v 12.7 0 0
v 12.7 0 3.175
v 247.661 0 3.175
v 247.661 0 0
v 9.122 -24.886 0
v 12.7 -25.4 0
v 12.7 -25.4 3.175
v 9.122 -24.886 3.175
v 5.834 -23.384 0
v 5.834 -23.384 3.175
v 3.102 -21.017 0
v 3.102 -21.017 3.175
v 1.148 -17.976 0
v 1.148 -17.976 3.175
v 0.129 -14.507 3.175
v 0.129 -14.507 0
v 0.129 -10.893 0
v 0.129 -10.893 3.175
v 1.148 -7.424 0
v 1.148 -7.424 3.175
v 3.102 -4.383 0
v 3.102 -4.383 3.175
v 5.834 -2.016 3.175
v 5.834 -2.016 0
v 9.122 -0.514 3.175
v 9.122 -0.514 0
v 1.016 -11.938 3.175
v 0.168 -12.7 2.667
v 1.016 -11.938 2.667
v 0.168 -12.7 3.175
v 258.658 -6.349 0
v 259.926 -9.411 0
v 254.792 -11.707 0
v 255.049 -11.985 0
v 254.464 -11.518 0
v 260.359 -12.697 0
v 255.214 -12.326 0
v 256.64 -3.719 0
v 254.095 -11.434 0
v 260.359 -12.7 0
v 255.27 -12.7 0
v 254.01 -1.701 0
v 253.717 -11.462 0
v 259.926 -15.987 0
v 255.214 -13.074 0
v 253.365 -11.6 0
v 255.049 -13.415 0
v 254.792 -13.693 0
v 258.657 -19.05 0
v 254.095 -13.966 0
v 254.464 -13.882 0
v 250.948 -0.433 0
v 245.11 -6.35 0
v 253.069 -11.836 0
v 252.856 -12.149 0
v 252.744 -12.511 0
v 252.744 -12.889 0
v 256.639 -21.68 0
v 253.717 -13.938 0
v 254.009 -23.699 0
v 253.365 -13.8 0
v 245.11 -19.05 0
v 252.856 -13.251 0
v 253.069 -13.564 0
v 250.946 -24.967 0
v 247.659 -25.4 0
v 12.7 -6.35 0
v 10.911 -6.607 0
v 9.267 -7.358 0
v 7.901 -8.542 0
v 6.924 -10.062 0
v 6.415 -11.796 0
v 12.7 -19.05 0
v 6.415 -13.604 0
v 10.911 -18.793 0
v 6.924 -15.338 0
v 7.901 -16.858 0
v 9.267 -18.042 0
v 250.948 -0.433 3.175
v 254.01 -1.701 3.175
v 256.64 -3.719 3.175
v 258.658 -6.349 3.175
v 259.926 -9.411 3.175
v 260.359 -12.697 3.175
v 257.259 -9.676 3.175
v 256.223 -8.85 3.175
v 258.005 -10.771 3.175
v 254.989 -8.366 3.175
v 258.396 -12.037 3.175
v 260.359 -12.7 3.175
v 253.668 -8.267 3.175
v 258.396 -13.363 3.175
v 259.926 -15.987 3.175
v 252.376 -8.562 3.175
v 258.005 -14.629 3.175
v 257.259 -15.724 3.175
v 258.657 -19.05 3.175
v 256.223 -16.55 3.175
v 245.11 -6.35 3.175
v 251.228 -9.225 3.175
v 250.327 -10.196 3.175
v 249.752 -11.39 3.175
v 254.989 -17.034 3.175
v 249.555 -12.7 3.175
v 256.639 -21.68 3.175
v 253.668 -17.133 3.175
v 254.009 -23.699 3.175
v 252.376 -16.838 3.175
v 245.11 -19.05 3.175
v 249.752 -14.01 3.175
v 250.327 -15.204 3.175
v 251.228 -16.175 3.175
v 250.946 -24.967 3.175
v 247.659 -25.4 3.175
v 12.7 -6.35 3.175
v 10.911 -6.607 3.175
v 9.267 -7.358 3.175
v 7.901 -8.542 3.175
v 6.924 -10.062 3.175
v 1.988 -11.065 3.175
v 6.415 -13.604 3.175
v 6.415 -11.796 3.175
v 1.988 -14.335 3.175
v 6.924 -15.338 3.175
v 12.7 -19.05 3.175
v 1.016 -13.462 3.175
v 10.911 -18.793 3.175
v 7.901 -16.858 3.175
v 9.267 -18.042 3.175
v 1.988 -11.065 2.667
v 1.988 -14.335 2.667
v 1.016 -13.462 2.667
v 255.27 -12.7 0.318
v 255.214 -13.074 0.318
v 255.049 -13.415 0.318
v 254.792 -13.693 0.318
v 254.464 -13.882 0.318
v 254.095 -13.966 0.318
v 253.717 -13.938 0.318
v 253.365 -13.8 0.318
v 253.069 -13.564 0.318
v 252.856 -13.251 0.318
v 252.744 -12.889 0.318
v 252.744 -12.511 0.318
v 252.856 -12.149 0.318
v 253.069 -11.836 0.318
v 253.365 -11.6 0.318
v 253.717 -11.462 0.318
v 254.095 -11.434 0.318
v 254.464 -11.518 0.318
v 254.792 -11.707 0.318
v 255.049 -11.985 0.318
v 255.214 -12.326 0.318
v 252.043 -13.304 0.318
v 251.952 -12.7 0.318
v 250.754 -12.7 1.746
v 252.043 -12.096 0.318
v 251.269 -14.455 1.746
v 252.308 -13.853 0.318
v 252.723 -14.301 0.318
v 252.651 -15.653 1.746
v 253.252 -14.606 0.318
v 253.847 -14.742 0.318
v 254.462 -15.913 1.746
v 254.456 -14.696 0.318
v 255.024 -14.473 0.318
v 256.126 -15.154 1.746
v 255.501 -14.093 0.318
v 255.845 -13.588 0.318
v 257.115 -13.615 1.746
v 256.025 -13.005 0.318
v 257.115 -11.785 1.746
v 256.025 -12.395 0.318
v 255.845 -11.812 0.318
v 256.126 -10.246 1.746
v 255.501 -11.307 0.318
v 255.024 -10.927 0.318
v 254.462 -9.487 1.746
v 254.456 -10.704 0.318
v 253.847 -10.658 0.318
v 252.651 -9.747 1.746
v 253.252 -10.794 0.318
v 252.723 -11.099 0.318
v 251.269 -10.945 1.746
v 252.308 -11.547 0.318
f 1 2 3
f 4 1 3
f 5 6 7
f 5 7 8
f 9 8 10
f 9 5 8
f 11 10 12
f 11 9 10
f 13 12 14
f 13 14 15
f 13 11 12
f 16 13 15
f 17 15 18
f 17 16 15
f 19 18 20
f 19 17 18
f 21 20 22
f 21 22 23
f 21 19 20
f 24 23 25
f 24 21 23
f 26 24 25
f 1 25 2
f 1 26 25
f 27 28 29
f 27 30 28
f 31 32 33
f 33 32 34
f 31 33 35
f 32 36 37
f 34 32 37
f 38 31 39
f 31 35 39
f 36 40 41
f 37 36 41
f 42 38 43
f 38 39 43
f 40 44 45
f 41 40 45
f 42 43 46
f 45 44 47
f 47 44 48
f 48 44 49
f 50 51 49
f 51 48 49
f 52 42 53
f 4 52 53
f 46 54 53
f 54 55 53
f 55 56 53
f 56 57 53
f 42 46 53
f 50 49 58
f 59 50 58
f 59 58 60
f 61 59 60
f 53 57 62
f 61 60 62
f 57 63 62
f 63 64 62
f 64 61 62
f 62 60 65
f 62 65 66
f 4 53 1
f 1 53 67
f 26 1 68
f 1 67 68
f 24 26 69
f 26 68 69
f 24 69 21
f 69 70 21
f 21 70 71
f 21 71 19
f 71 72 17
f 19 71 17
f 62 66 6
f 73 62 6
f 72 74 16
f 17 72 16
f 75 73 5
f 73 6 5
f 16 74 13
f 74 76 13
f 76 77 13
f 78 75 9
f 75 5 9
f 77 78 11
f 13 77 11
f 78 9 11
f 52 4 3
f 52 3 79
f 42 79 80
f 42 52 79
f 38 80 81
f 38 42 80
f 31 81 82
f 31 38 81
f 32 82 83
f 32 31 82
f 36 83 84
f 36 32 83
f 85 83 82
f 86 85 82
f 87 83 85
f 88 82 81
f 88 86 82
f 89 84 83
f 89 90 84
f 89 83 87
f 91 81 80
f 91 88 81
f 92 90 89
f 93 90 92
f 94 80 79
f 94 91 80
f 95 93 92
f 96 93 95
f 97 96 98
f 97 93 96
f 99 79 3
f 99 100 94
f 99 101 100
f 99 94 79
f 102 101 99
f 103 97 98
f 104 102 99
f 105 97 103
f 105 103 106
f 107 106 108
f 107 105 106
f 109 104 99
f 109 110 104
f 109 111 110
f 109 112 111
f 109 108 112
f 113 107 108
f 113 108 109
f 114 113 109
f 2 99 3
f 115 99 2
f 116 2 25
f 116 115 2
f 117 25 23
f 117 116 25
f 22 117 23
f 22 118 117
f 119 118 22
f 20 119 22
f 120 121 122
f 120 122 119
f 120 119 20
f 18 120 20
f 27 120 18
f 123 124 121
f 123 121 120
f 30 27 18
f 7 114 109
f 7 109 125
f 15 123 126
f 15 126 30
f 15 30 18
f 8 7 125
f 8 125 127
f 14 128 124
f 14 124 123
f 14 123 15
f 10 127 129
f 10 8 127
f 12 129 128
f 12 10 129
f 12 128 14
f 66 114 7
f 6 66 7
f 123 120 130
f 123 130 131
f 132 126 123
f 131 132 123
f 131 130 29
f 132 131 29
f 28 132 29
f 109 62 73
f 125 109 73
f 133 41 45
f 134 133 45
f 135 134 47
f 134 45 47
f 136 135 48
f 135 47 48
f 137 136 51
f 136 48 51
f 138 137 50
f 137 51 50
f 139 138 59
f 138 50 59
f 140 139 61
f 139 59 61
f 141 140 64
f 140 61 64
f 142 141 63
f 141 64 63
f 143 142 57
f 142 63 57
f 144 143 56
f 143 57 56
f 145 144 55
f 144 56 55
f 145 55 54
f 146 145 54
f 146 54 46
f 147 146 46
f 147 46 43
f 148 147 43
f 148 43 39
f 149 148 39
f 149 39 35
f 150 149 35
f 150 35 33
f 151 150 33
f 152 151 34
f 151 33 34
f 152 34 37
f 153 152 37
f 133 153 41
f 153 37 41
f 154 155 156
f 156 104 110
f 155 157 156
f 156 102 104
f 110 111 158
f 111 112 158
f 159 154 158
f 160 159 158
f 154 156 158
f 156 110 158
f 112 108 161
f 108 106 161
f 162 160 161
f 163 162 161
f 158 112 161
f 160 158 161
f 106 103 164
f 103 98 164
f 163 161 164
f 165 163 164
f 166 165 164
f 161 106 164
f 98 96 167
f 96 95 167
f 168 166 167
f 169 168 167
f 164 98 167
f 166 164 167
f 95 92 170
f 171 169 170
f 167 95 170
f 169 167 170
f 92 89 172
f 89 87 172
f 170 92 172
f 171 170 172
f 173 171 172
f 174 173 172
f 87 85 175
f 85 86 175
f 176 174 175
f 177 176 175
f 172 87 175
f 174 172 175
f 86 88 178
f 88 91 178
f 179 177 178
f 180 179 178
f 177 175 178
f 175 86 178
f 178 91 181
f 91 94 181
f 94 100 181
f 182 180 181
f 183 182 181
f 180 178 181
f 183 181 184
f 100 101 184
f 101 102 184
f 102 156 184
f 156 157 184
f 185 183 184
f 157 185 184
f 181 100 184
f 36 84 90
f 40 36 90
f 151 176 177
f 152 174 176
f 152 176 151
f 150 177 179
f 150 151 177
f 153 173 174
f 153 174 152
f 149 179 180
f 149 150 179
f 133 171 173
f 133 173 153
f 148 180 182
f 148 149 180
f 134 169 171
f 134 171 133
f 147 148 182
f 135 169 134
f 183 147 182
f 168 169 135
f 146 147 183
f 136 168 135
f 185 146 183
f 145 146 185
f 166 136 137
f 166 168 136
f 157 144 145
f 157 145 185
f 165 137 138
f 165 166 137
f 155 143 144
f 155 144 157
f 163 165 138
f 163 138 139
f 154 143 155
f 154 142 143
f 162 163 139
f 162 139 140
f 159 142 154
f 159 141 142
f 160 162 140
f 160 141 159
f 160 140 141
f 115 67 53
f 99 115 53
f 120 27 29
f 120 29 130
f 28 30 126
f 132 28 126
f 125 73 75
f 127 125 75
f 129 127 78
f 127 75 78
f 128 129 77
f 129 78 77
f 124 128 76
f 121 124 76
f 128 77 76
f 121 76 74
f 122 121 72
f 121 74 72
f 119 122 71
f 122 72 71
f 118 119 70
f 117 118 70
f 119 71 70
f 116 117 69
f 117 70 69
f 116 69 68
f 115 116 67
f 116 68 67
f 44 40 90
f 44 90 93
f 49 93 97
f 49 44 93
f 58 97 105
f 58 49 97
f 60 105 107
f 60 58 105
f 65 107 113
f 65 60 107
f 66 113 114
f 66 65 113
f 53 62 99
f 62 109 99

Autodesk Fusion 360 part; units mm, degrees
sketch "Sketch1" plane through (0, 0, 0) normal (0, 0, 1) x (1, 0, 0)
  line L0 (0, 0) -> (0, -12.7)
  line L1 (12.7, 0) -> (254, 0)
  line L2 (254, -25.4) -> (12.7, -25.4)
  line L3 (0, -25.4) -> (0, -12.7)
  arc A0 (12.7, 0) -> (0, -12.7) centre (12.7, -12.7) ccw
  arc A1 (0, -12.7) -> (12.7, -25.4) centre (12.7, -12.7) ccw
  circle A2 centre (254, -12.7) radius 1.27
  line L4 (254, -25.4) -> (255.27, -25.4)
  line L5 (255.27, 0) -> (254, 0)
  line L6 (255.27, 0) -> (245.11, 0)
  line L7 (245.11, -25.4) -> (255.27, -25.4)
  arc A3 (257.81, -12.7) -> (245.11, 0) centre (245.11, -12.7) ccw
  arc A4 (245.11, -25.4) -> (257.81, -12.7) centre (245.11, -12.7) ccw
  arc A5 (245.11, -19.05) -> (251.46, -12.7) centre (245.11, -12.7) ccw
  arc A6 (251.46, -12.7) -> (245.11, -6.35) centre (245.11, -12.7) ccw
  line L8 (254, -19.05) -> (12.7, -19.05)
  line L9 (12.7, -6.35) -> (254, -6.35)
  arc A7 (12.7, -6.35) -> (6.35, -12.7) centre (12.7, -12.7) ccw
  arc A8 (6.35, -12.7) -> (12.7, -19.05) centre (12.7, -12.7) ccw
  point P0 (0, -25.4)
  point P1 (257.81, 0)
  dimension "d1" = 25.4
  dimension "d3" = 12.7
  dimension "d4" = 12.7
  dimension "d5" = 2.54
  dimension "d6" = 2.54
  dimension "d7" = 12.7
  dimension "d8" = 12.7
  dimension "d9" = -6.35
  dimension "d10" = 6.35
  dimension "d11" = 6.35
  dimension "d12" = -6.35
extrude "Extrude1" add sketch "Sketch1" along normal blind 3.175
sketch "Sketch2" plane through (0, 0, 3.175) normal (0, 0, 1) x (-1, 0, 0)
  circle A0 centre (-254, 12.7) radius 1.27
  arc A1 (-12.7, 6.35) -> (-12.7, 19.05) centre (-12.7, 12.7) ccw
  line L0 (-12.7, 6.35) -> (-245.11, 6.35)
  arc A2 (-245.11, 19.05) -> (-245.11, 6.35) centre (-245.11, 12.7) ccw
  line L1 (-245.11, 19.05) -> (-12.7, 19.05)
  arc A3 (-12.7, 0) -> (-12.7, 25.4) centre (-12.7, 12.7) ccw
  line L2 (-12.7, 25.4) -> (-245.11, 25.4)
  arc A4 (-245.11, 25.4) -> (-245.11, 0) centre (-245.11, 12.7) ccw
  line L3 (-245.11, 0) -> (-12.7, 0)
  circle A5 centre (-254, 12.7) radius 2.0476
extrude "Extrude2" cut sketch "Sketch2" against normal blind 2.54 contours A5
sketch "Sketch3" plane through (0, 0, 3.175) normal (0, 0, 1) x (-1, 0, 0)
  circle A0 centre (-254, 12.7) radius 2.0476
  arc A1 (-12.7, 6.35) -> (-12.7, 19.05) centre (-12.7, 12.7) ccw
  line L0 (-12.7, 6.35) -> (-245.11, 6.35)
  line L1 (-245.11, 19.05) -> (-12.7, 19.05)
  arc A2 (-12.7, 0) -> (-12.7, 25.4) centre (-12.7, 12.7) ccw
  line L2 (-12.7, 25.4) -> (-245.11, 25.4)
  arc A3 (-245.11, 25.4) -> (-245.11, 0) centre (-245.11, 12.7) ccw
  line L3 (-245.11, 0) -> (-12.7, 0)
  line L4 (-245.11, 6.35) -> (-251.46, 6.35)
  line L5 (-251.46, 6.35) -> (-251.46, 19.05)
  line L6 (-251.46, 19.05) -> (-245.11, 19.05)
  line L7 (-245.11, 19.05) -> (-245.11, 6.35)
extrude "Extrude3" add sketch "Sketch3" against normal blind 3.175 contours L4 L5 L6 L7
sketch "Sketch4" plane through (0, 0, 3.175) normal (0, 0, 1) x (-1, 0, 0)
  arc A0 (-12.7, 0) -> (-12.7, 25.4) centre (-12.7, 12.7) ccw
  line L0 (-12.7, 25.4) -> (-245.11, 25.4)
  arc A1 (-245.11, 25.4) -> (-245.11, 0) centre (-245.11, 12.7) ccw
  line L1 (-245.11, 0) -> (-12.7, 0)
  circle A2 centre (-254, 12.7) radius 2.0476
  line L2 (-245.11, 19.05) -> (-12.7, 19.05)
  arc A3 (-12.7, 6.35) -> (-12.7, 19.05) centre (-12.7, 12.7) ccw
  line L3 (-12.7, 6.35) -> (-245.11, 6.35)
  line L4 (-245.11, 6.35) -> (-245.11, 19.05)
  line L5 (-245.11, 0) -> (-260.3587, 0)
  line L6 (-260.3587, 0) -> (-260.3587, 25.4)
  line L7 (-260.3587, 25.4) -> (-245.11, 25.4)
  line L8 (-245.11, 25.4) -> (-245.11, 0)
extrude "Extrude4" add sketch "Sketch4" against normal blind 3.175 contours A1 L5 L6 L7
extrude "Extrude5" cut 1 faces at (254.0316, -14.4834, 0.635) along direction (0, 0, -1) blind 0.3175
draft "Draft1" angle 40 neutral plane through (0, 0, 0.3175) pull (0, 0, 1) 1 faces at (253.949, -14.747, 2.2225)
fillet "Fillet1" radius 12.7 1 edges at (260.3587, -25.4, 1.5875)
fillet "Fillet2" radius 12.7 1 edges at (260.3587, 0, 1.5875)
sketch "Sketch5" plane through (0, 0, 3.175) normal (0, 0, 1) x (-1, 0, 0)
  arc A0 (-247.6587, 25.4) -> (-247.6587, 0) centre (-247.6587, 12.7) ccw
  line L0 (-247.6587, 0) -> (-12.7, 0)
  arc A1 (-12.7, 0) -> (-12.7, 25.4) centre (-12.7, 12.7) ccw
  line L1 (-12.7, 25.4) -> (-247.6587, 25.4)
  line L2 (-245.11, 19.05) -> (-12.7, 19.05)
  arc A2 (-12.7, 6.35) -> (-12.7, 19.05) centre (-12.7, 12.7) ccw
  line L3 (-12.7, 6.35) -> (-245.11, 6.35)
  line L4 (-245.11, 6.35) -> (-245.11, 19.05)
  circle A3 centre (-254, 12.7) radius 4.4453
  line L5 (0, 12.7) -> (-6.35, 12.7)
  line L6 (-0.1678, 12.7) -> (-1.016, 11.938)
  line L7 (-1.016, 11.938) -> (-1.988, 11.0648)
  line L8 (-0.1678, 12.7) -> (-1.016, 13.462)
  line L9 (-1.016, 13.462) -> (-1.988, 14.3352)
  line L10 (-1.988, 11.0648) -> (-1.988, 14.3352)
extrude "Extrude6" cut sketch "Sketch5" against normal blind 0.508 contours L5 L6 L7 L10 | L5 L8 L9 L10
equation "d21 = ( -0.025 / 2 ) * 1 in"
